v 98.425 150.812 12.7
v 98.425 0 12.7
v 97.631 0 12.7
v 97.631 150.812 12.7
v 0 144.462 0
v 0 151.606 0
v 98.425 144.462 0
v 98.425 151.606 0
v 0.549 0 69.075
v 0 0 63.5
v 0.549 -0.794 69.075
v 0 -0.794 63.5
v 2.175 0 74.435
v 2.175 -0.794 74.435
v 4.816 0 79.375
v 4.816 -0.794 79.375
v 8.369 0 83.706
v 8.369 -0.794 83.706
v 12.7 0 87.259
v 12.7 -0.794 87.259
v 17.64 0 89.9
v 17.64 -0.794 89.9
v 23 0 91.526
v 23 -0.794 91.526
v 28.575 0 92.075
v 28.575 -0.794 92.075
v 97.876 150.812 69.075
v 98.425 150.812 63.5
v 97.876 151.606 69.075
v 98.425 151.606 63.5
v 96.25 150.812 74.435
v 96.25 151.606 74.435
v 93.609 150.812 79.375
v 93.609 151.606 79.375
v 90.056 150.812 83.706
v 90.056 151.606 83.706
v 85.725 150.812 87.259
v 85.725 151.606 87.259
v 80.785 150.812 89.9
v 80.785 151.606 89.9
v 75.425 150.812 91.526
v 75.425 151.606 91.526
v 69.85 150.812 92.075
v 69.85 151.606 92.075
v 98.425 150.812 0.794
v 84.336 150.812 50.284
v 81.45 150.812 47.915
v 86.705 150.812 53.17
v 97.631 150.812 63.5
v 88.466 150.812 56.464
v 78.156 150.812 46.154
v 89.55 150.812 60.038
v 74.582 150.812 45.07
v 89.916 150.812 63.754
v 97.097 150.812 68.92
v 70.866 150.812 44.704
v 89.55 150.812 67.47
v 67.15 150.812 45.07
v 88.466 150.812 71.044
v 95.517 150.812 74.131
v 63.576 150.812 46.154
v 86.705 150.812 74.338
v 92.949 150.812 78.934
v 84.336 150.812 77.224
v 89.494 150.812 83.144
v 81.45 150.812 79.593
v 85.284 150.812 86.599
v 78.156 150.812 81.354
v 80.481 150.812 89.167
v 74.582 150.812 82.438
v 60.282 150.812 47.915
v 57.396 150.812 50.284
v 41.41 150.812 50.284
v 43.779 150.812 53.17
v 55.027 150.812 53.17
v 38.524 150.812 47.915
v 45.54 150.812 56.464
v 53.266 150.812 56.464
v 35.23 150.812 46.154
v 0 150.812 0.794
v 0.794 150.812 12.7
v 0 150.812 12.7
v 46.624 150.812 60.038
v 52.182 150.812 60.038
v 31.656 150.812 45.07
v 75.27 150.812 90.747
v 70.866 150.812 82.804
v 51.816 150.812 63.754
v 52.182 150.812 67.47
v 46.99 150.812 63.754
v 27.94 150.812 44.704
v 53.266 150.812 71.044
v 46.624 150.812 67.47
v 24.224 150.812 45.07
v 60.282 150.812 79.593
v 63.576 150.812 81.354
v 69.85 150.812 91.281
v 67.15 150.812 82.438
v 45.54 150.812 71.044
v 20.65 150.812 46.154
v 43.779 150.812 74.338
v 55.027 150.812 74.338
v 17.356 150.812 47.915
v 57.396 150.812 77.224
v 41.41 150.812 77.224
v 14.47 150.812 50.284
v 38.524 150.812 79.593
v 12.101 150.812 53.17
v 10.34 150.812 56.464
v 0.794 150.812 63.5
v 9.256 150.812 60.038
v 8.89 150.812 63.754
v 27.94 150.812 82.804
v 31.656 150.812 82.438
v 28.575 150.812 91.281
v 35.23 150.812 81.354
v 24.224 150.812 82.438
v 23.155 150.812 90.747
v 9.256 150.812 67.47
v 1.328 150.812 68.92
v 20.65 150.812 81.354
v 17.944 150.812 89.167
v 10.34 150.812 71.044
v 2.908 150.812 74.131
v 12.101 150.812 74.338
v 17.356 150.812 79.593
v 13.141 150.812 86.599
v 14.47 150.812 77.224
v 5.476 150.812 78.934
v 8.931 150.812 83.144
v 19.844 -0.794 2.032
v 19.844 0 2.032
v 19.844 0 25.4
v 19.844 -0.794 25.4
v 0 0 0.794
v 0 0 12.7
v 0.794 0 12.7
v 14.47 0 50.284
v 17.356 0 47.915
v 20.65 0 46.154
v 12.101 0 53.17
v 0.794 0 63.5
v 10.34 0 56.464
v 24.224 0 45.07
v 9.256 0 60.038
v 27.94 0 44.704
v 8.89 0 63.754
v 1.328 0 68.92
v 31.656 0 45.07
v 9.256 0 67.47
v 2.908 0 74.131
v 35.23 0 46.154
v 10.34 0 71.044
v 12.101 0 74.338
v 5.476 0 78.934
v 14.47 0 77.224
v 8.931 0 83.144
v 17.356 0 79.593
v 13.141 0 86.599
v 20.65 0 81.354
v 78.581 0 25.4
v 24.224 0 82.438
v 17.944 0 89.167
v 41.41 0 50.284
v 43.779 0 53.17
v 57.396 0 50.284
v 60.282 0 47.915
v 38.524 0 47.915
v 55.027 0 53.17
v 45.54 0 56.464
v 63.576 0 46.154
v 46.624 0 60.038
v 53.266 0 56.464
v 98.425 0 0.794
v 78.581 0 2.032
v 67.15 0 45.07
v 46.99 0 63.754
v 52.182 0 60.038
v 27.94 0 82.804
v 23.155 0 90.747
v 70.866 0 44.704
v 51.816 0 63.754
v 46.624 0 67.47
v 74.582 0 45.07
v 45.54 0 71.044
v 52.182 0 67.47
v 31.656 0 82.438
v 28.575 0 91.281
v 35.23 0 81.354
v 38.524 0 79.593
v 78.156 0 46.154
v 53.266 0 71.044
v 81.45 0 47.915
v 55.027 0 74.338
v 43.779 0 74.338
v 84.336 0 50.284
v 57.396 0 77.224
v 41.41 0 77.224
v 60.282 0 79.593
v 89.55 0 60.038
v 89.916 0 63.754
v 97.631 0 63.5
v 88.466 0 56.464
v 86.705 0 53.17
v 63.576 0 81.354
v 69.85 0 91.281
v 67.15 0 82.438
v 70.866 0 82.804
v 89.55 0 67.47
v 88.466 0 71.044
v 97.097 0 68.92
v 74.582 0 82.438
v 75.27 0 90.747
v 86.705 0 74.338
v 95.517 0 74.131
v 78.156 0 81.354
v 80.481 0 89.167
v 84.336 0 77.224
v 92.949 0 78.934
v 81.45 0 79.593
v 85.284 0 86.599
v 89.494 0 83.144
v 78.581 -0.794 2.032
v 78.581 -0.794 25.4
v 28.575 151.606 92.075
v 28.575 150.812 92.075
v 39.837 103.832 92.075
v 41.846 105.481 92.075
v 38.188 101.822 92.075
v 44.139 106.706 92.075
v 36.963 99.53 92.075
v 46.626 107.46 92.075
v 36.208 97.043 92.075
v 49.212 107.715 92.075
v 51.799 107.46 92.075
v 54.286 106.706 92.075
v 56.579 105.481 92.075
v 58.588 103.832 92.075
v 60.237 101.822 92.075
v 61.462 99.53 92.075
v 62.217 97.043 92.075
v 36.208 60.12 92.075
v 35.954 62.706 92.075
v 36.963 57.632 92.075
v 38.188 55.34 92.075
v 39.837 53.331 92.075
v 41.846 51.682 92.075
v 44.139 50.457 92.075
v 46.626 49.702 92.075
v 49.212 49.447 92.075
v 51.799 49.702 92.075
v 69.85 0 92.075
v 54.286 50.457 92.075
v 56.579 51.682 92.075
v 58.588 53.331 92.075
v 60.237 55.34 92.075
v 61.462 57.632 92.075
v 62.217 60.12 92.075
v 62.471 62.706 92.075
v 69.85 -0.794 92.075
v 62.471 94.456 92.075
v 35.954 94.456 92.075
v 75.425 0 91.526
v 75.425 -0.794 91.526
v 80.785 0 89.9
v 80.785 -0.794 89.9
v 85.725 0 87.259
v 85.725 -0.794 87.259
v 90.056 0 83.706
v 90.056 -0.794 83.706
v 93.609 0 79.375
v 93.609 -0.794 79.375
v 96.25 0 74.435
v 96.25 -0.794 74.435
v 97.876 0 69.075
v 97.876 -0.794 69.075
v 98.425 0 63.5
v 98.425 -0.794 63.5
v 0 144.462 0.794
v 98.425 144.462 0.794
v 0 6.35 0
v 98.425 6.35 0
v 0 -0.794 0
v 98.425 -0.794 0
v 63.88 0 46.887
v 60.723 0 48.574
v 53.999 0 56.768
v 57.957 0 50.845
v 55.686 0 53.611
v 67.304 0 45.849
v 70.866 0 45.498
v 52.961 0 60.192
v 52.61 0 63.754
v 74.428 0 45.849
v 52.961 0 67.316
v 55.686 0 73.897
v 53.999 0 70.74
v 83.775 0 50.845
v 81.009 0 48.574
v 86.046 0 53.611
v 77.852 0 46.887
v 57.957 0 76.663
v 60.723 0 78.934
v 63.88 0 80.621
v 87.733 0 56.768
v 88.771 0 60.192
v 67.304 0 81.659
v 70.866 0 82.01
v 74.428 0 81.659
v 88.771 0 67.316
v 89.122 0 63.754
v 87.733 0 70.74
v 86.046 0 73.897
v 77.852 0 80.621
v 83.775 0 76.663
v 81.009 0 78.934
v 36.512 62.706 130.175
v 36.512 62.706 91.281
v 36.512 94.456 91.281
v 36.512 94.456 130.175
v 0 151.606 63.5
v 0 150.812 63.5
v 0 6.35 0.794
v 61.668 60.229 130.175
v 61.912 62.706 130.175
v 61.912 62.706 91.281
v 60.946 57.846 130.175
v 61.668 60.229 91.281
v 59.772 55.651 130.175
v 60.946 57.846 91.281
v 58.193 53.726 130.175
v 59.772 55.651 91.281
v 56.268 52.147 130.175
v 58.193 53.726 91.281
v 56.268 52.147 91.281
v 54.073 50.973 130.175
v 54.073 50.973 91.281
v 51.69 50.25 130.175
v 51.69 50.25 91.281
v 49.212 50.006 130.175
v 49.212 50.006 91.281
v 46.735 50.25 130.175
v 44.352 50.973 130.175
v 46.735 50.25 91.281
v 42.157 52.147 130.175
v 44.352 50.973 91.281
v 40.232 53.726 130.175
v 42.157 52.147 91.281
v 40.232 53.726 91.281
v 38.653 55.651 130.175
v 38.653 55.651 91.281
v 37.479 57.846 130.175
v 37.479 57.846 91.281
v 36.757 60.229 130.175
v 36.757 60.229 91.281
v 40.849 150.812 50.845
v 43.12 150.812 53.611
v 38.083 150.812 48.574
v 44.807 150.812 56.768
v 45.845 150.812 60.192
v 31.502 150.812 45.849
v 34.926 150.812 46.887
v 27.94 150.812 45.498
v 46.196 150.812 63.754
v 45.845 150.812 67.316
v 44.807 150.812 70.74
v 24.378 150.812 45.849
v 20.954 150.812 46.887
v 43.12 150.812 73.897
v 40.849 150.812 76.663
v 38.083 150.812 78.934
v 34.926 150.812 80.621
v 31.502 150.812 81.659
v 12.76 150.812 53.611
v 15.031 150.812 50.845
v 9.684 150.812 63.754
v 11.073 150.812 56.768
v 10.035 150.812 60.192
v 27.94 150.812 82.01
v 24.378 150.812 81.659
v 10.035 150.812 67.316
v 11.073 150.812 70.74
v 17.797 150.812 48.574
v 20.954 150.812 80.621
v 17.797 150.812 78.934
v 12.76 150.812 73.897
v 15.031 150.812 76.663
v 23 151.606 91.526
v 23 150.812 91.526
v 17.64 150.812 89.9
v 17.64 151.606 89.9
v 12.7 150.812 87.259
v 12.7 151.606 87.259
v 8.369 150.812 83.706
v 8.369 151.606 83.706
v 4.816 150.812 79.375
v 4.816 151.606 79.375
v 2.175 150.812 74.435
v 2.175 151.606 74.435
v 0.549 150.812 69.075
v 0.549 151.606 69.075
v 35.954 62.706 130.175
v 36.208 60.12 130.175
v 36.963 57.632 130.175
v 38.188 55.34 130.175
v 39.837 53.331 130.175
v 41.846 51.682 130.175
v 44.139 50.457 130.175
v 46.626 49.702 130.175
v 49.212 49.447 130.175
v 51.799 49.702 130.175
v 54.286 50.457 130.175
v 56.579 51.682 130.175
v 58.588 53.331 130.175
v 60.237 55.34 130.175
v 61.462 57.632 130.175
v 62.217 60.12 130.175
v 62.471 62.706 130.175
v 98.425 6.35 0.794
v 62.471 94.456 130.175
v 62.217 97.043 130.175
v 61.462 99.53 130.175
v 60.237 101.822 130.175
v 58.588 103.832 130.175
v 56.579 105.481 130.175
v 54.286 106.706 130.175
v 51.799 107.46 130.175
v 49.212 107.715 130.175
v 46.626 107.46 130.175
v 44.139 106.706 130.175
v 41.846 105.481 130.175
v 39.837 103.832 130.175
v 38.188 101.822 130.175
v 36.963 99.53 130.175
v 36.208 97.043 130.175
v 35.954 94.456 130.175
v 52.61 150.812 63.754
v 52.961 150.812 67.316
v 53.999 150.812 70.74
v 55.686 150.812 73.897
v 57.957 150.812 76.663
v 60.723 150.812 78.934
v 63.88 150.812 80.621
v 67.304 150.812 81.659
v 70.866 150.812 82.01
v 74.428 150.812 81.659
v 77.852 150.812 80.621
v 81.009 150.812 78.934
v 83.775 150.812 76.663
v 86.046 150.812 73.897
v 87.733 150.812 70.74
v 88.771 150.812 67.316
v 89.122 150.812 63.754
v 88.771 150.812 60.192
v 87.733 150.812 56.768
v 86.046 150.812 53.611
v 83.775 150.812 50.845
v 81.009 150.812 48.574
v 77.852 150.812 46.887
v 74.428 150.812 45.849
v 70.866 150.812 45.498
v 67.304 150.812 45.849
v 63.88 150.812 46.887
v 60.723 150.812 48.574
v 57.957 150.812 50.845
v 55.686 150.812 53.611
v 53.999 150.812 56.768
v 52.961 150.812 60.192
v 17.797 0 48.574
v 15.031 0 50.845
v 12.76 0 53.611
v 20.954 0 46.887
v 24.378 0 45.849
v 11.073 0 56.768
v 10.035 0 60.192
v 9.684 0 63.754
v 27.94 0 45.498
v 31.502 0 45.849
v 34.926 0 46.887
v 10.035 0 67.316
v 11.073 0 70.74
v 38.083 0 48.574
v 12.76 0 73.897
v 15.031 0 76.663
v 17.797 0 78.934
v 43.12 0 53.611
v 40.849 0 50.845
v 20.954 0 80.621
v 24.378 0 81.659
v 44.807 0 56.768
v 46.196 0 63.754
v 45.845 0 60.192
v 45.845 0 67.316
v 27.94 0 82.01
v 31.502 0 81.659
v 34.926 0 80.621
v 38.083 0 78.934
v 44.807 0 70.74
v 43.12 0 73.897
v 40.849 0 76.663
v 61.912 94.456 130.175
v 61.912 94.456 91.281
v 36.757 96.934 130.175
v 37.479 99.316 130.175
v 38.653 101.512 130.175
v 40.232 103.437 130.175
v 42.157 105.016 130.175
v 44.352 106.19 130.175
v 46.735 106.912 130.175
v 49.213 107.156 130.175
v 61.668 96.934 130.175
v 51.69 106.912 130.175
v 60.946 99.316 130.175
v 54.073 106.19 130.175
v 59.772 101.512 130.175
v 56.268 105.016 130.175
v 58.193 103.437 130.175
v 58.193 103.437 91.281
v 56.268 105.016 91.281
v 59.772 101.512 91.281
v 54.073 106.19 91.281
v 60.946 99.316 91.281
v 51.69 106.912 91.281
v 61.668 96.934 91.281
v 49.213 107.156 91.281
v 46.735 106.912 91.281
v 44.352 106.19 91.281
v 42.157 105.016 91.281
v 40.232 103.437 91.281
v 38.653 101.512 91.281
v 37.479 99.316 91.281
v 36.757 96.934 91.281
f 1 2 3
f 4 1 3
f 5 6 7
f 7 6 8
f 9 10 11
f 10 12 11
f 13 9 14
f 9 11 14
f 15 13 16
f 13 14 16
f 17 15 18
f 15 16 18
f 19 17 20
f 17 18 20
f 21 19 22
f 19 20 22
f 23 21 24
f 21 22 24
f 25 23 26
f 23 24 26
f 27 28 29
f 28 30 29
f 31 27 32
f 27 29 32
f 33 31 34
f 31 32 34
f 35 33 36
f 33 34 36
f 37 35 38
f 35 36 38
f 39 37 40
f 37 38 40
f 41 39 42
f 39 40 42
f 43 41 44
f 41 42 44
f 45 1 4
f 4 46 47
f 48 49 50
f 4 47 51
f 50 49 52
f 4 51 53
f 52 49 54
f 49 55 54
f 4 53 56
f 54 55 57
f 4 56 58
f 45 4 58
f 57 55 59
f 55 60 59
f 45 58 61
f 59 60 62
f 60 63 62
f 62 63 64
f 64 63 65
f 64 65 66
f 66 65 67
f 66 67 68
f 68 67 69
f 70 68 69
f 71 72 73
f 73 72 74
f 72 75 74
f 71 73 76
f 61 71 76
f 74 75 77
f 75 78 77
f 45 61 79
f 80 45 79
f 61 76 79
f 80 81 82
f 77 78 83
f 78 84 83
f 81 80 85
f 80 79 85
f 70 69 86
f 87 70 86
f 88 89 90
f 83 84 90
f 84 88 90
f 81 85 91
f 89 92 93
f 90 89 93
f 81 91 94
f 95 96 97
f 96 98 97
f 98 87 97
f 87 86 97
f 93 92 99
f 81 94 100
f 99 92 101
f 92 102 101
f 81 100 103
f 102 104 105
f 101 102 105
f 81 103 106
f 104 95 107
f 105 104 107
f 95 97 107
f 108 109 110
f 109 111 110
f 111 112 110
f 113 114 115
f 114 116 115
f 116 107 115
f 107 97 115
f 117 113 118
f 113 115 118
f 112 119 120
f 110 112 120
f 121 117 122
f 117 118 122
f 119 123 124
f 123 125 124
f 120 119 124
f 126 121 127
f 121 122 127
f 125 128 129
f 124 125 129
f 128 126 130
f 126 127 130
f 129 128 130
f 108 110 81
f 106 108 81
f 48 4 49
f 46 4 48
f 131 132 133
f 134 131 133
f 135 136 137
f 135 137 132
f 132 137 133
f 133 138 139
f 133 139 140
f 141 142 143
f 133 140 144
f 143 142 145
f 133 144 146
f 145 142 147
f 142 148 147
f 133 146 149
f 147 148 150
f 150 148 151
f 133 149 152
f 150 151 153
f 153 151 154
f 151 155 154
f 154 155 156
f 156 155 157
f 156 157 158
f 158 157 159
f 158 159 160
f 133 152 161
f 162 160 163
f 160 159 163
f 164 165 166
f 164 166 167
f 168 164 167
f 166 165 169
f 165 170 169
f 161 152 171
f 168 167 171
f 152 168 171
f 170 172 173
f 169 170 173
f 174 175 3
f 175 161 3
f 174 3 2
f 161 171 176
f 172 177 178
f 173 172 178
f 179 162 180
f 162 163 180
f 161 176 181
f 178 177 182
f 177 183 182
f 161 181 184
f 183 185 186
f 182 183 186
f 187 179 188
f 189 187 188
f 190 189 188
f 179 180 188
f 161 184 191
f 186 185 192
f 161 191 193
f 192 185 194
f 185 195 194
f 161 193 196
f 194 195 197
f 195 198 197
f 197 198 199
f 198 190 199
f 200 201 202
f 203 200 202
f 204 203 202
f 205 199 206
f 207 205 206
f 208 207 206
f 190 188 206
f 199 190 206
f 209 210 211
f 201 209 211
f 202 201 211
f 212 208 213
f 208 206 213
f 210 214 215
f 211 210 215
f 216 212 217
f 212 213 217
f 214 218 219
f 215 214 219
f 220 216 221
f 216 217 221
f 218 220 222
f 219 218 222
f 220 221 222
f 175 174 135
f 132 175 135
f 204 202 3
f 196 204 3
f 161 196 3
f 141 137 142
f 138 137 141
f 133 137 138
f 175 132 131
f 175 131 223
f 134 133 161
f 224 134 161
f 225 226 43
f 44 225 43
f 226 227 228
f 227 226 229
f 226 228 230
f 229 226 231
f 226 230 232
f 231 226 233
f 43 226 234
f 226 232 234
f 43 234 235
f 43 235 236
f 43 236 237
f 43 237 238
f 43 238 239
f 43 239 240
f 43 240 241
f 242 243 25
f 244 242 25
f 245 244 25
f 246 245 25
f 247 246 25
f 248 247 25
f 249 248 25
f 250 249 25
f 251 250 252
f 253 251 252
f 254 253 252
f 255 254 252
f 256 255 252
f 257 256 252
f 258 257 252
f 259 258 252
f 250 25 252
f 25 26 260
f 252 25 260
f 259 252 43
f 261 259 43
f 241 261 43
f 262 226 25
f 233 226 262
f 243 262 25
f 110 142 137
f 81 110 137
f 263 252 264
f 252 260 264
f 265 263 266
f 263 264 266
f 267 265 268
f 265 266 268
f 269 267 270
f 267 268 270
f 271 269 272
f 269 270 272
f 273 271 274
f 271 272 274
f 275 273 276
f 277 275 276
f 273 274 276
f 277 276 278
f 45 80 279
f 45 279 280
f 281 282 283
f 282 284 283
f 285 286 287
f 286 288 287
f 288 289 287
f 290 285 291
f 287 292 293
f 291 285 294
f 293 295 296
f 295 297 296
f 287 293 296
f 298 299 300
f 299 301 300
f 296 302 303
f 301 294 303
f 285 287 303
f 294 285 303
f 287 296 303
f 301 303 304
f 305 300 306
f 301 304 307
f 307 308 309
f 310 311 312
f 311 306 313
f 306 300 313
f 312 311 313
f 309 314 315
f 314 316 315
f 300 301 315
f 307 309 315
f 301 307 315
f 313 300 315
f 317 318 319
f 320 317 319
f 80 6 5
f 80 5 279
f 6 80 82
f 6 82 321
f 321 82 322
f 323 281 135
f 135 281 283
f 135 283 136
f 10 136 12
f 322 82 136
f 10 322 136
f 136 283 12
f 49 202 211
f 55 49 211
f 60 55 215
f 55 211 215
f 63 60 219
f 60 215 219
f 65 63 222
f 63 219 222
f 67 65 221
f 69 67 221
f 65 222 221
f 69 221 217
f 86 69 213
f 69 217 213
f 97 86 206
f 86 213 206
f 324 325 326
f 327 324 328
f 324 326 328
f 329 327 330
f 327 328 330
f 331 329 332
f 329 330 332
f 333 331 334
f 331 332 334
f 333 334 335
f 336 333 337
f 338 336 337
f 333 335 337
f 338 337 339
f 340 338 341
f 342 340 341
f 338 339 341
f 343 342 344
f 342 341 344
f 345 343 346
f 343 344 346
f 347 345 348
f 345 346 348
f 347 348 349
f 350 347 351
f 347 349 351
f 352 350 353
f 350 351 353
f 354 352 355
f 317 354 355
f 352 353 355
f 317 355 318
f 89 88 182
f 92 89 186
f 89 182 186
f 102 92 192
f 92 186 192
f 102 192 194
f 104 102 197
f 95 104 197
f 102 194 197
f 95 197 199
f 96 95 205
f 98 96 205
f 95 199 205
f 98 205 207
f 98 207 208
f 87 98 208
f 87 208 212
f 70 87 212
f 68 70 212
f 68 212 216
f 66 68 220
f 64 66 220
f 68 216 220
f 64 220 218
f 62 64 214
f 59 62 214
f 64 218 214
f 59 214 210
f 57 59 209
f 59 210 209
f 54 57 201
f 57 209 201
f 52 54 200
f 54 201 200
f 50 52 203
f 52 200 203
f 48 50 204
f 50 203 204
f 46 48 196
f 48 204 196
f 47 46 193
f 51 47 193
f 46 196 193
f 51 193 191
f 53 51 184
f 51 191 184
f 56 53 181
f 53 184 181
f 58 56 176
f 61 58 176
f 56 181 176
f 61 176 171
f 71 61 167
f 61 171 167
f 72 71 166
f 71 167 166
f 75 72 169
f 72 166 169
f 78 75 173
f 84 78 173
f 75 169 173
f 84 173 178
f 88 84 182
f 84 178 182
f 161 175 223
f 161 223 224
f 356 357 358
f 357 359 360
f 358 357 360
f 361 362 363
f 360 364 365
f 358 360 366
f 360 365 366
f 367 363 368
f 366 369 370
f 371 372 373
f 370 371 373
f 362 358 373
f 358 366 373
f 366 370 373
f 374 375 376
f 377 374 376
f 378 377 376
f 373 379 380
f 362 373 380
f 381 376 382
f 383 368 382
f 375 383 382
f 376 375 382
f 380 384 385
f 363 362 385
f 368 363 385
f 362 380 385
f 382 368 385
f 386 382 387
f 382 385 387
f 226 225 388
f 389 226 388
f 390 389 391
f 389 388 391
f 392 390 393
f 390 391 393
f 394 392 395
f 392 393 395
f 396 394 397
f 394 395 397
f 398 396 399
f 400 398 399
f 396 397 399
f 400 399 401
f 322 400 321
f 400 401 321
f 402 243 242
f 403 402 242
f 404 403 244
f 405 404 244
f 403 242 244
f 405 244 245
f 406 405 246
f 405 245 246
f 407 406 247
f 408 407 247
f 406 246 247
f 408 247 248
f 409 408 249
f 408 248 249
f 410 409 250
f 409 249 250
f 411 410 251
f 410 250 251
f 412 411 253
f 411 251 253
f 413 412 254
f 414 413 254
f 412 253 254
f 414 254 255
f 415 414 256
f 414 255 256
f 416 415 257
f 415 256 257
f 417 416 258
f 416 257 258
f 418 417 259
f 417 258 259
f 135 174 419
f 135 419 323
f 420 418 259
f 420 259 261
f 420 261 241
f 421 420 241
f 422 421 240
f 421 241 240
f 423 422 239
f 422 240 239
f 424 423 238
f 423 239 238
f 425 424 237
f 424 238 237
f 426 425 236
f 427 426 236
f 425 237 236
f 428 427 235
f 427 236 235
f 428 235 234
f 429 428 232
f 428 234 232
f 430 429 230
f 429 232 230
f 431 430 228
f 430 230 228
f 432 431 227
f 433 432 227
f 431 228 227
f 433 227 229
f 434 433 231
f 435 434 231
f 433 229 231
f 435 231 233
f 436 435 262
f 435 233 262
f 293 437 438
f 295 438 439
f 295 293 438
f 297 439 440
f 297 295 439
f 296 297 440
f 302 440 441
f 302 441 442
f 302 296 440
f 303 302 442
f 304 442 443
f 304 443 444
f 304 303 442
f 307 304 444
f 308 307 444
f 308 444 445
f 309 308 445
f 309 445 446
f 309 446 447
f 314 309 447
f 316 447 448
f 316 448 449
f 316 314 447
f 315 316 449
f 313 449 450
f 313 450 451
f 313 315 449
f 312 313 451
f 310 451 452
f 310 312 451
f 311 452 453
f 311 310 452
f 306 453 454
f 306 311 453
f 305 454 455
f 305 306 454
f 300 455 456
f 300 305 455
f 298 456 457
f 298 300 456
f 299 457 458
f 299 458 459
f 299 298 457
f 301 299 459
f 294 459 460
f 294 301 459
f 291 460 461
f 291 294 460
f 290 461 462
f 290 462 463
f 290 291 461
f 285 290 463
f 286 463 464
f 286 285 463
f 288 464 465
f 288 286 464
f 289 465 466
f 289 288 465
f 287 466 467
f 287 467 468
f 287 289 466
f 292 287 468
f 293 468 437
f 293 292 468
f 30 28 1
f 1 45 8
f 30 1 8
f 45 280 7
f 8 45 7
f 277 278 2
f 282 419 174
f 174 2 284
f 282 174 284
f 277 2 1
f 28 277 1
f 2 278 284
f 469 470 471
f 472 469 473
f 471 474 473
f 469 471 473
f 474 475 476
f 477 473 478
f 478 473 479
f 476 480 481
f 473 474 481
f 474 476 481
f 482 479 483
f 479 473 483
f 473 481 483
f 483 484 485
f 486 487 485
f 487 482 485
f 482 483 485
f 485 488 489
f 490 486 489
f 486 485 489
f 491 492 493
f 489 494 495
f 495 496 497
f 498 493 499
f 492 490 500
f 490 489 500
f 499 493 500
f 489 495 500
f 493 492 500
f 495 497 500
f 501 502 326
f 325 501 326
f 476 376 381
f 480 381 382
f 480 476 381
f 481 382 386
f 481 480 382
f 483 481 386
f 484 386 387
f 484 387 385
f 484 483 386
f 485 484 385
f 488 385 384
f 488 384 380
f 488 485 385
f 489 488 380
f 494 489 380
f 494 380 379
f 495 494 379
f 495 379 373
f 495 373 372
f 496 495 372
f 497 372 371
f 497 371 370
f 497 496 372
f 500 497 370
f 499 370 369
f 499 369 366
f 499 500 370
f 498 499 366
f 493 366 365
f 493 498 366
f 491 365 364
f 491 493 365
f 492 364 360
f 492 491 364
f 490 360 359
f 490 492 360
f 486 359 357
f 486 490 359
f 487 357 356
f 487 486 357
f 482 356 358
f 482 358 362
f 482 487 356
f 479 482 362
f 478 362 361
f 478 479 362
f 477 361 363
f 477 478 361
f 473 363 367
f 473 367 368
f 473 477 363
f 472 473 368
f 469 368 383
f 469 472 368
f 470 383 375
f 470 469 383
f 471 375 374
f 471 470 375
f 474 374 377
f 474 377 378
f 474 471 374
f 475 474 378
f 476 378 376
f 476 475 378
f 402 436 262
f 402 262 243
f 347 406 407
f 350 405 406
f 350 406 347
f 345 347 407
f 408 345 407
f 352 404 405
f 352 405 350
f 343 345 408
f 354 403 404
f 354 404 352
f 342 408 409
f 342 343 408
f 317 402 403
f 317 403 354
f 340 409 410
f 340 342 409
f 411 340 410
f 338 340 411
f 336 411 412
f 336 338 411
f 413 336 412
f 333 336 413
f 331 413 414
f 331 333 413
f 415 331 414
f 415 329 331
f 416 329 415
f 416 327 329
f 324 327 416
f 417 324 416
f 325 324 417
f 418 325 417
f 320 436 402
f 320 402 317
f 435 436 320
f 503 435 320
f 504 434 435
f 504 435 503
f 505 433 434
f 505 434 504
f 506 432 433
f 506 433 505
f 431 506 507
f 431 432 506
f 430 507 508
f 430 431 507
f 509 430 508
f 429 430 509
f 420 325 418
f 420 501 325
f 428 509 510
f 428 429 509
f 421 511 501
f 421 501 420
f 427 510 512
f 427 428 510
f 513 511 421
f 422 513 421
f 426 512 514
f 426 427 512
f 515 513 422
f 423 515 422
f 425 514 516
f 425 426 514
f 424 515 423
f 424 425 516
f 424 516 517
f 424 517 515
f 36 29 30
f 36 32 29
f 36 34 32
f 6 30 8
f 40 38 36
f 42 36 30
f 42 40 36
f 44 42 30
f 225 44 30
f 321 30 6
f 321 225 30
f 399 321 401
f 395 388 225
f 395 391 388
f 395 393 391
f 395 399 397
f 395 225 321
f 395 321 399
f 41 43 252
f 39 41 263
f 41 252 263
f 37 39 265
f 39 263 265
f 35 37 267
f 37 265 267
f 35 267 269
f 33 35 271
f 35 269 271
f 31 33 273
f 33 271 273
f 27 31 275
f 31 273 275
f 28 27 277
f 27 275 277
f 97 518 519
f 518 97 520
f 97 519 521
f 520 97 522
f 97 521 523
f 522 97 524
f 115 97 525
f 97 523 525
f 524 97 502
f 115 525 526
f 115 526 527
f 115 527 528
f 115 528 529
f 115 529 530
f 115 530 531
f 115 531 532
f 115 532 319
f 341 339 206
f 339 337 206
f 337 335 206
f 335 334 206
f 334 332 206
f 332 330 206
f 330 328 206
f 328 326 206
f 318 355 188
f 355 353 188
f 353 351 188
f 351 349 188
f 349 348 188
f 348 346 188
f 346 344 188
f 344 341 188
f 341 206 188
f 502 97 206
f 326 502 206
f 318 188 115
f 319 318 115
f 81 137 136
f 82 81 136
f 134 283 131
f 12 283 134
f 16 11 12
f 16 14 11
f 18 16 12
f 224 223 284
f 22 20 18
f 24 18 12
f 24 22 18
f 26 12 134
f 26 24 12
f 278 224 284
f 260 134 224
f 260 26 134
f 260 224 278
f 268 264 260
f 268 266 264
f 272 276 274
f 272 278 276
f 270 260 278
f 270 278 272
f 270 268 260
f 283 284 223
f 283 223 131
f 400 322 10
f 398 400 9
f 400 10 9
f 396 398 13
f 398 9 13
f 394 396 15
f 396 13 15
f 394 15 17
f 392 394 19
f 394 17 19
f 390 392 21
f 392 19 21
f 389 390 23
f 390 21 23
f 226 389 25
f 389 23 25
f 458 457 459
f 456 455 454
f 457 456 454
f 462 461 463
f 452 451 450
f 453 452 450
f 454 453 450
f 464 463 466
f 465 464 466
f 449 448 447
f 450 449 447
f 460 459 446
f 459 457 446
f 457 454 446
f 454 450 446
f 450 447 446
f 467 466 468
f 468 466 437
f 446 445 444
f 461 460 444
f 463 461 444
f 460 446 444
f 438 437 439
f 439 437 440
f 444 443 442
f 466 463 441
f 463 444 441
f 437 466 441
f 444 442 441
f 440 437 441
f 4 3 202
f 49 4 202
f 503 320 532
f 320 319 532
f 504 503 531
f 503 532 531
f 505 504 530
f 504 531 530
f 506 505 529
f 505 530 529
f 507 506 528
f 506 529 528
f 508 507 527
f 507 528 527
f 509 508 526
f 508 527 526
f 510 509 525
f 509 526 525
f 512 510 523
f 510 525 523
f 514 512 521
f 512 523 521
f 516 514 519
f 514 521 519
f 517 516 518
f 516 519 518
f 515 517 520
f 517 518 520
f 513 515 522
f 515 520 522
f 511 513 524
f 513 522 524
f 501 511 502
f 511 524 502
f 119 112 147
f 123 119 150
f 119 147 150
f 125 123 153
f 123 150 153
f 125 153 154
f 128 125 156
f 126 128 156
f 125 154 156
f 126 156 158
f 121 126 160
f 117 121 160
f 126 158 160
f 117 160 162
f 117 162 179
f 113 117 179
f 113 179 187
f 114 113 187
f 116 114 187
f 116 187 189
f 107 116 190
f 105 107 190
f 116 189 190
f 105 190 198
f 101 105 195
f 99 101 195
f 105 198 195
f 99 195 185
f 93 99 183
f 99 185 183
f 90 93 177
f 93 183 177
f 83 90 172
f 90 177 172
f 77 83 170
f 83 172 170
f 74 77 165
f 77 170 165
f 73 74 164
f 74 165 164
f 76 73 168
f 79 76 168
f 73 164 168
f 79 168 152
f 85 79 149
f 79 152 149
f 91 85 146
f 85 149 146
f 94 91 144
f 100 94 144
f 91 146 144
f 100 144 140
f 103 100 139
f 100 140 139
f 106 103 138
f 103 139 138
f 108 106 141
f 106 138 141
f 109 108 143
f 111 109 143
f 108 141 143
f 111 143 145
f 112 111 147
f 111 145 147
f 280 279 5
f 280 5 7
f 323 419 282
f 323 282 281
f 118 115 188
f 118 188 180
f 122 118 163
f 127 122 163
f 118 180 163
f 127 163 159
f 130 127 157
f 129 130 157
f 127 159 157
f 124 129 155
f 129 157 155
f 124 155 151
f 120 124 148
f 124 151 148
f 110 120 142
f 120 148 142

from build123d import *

# Parameters (mm, degrees)
F0_W      = 98.425
F0_H      = 92.075
F0_W_2    = 58.7375
F0_H_2    = 23.368
F1_DEPTH  = 0.79375
F2_R      = 28.575
F3_R      = 19.05
F3_R_2    = 18.25625
F4_DEPTH  = 150.8125
F5_W      = 98.425
F5_H      = 92.075
F6_DEPTH  = 0.79375
F7_R      = 28.575
F8_W      = 98.425
F8_H      = 0.79375
F9_DEPTH  = 6.35
F10_W     = 98.425
F10_H     = 0.79375
F11_DEPTH = 6.35
F13_DEPTH = 151.5745
F15_DEPTH = 2.54
F17_DEPTH = 38.1


with BuildPart() as f1:
    # F0 (on Front) → F1 (new body)
    with BuildSketch(Plane.XZ):
        with Locations((49.2125, 46.0375)):
            Rectangle(F0_W, F0_H)
        with Locations((49.2125, 13.716)):
            Rectangle(F0_W_2, F0_H_2, mode=Mode.SUBTRACT)
    extrude(amount=F1_DEPTH)

    # F2
    f2_edges = [f1.edges().sort_by_distance(p)[0] for p in [
        (0, -0.396875, 92.075),
        (98.425, -0.396875, 92.075),
    ]]
    fillet(f2_edges, radius=F2_R)

    # F3 (on face) → F4 (join)
    with BuildSketch(Plane(origin=(0, 0, 0), x_dir=(-1, 0, 0), z_dir=(0, 1, 0))):
        with Locations((-70.866, 63.754)):
            Circle(F3_R)
        with Locations((-70.866, 63.754)):
            Circle(F3_R_2, mode=Mode.SUBTRACT)
        with Locations((-27.94, 63.754)):
            Circle(F3_R)
        with Locations((-27.94, 63.754)):
            Circle(F3_R_2, mode=Mode.SUBTRACT)
    extrude(amount=F4_DEPTH)

    # F5 (on face) → F6 (join)
    with BuildSketch(Plane(origin=(0, 150.8125, 0), x_dir=(-1, 0, 0), z_dir=(0, 1, 0))):
        with Locations((-49.2125, 46.0375)):
            Rectangle(F5_W, F5_H)
    extrude(amount=F6_DEPTH)

    # F7
    f7_edges = [f1.edges().sort_by_distance(p)[0] for p in [
        (0, 151.209375, 92.075),
        (98.425, 151.209375, 92.075),
    ]]
    fillet(f7_edges, radius=F7_R)

    # F8 (on face) → F9 (join)
    with BuildSketch(Plane(origin=(0, 0, 0), x_dir=(-1, 0, 0), z_dir=(0, 1, 0))):
        with Locations((-49.2125, 0.396875)):
            Rectangle(F8_W, F8_H)
    extrude(amount=F9_DEPTH)

    # F10 (on face) → F11 (join)
    with BuildSketch(Plane.XZ.offset(-150.8125)):
        with Locations((49.2125, 0.396875)):
            Rectangle(F10_W, F10_H)
    extrude(amount=F11_DEPTH)

    # F12 (on face) → F13 (join)
    with BuildSketch(Plane(origin=(0, 0, 0), x_dir=(-1, 0, 0), z_dir=(0, 1, 0))):
        with BuildLine():
            Line((-98.425, 63.5), (-98.425, 12.7))
            Line((-98.425, 12.7), (-97.63125, 12.7))
            Line((-97.63125, 12.7), (-97.63125, 56.811744))
            ThreePointArc((-97.63125, 56.811744), (-98.225869, 60.132404), (-98.425, 63.5))
        make_face()
        with BuildLine():
            ThreePointArc((-69.85, 92.075), (-90.055576, 83.705576), (-98.425, 63.5))
            ThreePointArc((-98.425, 63.5), (-98.225869, 60.132404), (-97.63125, 56.811744))
            Line((-97.63125, 56.811744), (-97.63125, 63.5))
            ThreePointArc((-97.63125, 63.5), (-89.49431, 83.14431), (-69.85, 91.28125))
            Line((-69.85, 91.28125), (-28.575, 91.28125))
            ThreePointArc((-28.575, 91.28125), (-8.93069, 83.14431), (-0.79375, 63.5))
            Line((-0.79375, 63.5), (-0.79375, 12.7))
            Line((-0.79375, 12.7), (0, 12.7))
            Line((0, 12.7), (0, 63.5))
            ThreePointArc((0, 63.5), (-8.369424, 83.705576), (-28.575, 92.075))
            Line((-28.575, 92.075), (-69.85, 92.075))
        make_face()
    extrude(amount=F13_DEPTH)

    # F14 (on face) → F15 (cut)
    with BuildSketch(Plane.XY.offset(92.075)):
        with BuildLine():
            Line((61.9125, 62.70625), (61.9125, 94.45625))
            ThreePointArc((61.9125, 94.45625), (49.2125, 107.15625), (36.5125, 94.45625))
            Line((36.5125, 94.45625), (36.5125, 62.70625))
            ThreePointArc((36.5125, 62.70625), (49.2125, 50.00625), (61.9125, 62.70625))
        make_face()
    extrude(amount=-F15_DEPTH, mode=Mode.SUBTRACT)

    # F16 (on face) → F17 (join)
    with BuildSketch(Plane.XY.offset(92.075)):
        with BuildLine():
            Line((35.9537, 94.45625), (35.9537, 62.70625))
            ThreePointArc((35.9537, 62.70625), (49.2125, 49.44745), (62.4713, 62.70625))
            Line((62.4713, 62.70625), (62.4713, 94.45625))
            ThreePointArc((62.4713, 94.45625), (49.2125, 107.71505), (35.9537, 94.45625))
        make_face()
        with BuildLine():
            ThreePointArc((36.5125, 94.45625), (49.2125, 107.15625), (61.9125, 94.45625))
            Line((61.9125, 94.45625), (61.9125, 62.70625))
            ThreePointArc((61.9125, 62.70625), (49.2125, 50.00625), (36.5125, 62.70625))
            Line((36.5125, 62.70625), (36.5125, 94.45625))
        make_face(mode=Mode.SUBTRACT)
    extrude(amount=F17_DEPTH)


solid = f1.part
